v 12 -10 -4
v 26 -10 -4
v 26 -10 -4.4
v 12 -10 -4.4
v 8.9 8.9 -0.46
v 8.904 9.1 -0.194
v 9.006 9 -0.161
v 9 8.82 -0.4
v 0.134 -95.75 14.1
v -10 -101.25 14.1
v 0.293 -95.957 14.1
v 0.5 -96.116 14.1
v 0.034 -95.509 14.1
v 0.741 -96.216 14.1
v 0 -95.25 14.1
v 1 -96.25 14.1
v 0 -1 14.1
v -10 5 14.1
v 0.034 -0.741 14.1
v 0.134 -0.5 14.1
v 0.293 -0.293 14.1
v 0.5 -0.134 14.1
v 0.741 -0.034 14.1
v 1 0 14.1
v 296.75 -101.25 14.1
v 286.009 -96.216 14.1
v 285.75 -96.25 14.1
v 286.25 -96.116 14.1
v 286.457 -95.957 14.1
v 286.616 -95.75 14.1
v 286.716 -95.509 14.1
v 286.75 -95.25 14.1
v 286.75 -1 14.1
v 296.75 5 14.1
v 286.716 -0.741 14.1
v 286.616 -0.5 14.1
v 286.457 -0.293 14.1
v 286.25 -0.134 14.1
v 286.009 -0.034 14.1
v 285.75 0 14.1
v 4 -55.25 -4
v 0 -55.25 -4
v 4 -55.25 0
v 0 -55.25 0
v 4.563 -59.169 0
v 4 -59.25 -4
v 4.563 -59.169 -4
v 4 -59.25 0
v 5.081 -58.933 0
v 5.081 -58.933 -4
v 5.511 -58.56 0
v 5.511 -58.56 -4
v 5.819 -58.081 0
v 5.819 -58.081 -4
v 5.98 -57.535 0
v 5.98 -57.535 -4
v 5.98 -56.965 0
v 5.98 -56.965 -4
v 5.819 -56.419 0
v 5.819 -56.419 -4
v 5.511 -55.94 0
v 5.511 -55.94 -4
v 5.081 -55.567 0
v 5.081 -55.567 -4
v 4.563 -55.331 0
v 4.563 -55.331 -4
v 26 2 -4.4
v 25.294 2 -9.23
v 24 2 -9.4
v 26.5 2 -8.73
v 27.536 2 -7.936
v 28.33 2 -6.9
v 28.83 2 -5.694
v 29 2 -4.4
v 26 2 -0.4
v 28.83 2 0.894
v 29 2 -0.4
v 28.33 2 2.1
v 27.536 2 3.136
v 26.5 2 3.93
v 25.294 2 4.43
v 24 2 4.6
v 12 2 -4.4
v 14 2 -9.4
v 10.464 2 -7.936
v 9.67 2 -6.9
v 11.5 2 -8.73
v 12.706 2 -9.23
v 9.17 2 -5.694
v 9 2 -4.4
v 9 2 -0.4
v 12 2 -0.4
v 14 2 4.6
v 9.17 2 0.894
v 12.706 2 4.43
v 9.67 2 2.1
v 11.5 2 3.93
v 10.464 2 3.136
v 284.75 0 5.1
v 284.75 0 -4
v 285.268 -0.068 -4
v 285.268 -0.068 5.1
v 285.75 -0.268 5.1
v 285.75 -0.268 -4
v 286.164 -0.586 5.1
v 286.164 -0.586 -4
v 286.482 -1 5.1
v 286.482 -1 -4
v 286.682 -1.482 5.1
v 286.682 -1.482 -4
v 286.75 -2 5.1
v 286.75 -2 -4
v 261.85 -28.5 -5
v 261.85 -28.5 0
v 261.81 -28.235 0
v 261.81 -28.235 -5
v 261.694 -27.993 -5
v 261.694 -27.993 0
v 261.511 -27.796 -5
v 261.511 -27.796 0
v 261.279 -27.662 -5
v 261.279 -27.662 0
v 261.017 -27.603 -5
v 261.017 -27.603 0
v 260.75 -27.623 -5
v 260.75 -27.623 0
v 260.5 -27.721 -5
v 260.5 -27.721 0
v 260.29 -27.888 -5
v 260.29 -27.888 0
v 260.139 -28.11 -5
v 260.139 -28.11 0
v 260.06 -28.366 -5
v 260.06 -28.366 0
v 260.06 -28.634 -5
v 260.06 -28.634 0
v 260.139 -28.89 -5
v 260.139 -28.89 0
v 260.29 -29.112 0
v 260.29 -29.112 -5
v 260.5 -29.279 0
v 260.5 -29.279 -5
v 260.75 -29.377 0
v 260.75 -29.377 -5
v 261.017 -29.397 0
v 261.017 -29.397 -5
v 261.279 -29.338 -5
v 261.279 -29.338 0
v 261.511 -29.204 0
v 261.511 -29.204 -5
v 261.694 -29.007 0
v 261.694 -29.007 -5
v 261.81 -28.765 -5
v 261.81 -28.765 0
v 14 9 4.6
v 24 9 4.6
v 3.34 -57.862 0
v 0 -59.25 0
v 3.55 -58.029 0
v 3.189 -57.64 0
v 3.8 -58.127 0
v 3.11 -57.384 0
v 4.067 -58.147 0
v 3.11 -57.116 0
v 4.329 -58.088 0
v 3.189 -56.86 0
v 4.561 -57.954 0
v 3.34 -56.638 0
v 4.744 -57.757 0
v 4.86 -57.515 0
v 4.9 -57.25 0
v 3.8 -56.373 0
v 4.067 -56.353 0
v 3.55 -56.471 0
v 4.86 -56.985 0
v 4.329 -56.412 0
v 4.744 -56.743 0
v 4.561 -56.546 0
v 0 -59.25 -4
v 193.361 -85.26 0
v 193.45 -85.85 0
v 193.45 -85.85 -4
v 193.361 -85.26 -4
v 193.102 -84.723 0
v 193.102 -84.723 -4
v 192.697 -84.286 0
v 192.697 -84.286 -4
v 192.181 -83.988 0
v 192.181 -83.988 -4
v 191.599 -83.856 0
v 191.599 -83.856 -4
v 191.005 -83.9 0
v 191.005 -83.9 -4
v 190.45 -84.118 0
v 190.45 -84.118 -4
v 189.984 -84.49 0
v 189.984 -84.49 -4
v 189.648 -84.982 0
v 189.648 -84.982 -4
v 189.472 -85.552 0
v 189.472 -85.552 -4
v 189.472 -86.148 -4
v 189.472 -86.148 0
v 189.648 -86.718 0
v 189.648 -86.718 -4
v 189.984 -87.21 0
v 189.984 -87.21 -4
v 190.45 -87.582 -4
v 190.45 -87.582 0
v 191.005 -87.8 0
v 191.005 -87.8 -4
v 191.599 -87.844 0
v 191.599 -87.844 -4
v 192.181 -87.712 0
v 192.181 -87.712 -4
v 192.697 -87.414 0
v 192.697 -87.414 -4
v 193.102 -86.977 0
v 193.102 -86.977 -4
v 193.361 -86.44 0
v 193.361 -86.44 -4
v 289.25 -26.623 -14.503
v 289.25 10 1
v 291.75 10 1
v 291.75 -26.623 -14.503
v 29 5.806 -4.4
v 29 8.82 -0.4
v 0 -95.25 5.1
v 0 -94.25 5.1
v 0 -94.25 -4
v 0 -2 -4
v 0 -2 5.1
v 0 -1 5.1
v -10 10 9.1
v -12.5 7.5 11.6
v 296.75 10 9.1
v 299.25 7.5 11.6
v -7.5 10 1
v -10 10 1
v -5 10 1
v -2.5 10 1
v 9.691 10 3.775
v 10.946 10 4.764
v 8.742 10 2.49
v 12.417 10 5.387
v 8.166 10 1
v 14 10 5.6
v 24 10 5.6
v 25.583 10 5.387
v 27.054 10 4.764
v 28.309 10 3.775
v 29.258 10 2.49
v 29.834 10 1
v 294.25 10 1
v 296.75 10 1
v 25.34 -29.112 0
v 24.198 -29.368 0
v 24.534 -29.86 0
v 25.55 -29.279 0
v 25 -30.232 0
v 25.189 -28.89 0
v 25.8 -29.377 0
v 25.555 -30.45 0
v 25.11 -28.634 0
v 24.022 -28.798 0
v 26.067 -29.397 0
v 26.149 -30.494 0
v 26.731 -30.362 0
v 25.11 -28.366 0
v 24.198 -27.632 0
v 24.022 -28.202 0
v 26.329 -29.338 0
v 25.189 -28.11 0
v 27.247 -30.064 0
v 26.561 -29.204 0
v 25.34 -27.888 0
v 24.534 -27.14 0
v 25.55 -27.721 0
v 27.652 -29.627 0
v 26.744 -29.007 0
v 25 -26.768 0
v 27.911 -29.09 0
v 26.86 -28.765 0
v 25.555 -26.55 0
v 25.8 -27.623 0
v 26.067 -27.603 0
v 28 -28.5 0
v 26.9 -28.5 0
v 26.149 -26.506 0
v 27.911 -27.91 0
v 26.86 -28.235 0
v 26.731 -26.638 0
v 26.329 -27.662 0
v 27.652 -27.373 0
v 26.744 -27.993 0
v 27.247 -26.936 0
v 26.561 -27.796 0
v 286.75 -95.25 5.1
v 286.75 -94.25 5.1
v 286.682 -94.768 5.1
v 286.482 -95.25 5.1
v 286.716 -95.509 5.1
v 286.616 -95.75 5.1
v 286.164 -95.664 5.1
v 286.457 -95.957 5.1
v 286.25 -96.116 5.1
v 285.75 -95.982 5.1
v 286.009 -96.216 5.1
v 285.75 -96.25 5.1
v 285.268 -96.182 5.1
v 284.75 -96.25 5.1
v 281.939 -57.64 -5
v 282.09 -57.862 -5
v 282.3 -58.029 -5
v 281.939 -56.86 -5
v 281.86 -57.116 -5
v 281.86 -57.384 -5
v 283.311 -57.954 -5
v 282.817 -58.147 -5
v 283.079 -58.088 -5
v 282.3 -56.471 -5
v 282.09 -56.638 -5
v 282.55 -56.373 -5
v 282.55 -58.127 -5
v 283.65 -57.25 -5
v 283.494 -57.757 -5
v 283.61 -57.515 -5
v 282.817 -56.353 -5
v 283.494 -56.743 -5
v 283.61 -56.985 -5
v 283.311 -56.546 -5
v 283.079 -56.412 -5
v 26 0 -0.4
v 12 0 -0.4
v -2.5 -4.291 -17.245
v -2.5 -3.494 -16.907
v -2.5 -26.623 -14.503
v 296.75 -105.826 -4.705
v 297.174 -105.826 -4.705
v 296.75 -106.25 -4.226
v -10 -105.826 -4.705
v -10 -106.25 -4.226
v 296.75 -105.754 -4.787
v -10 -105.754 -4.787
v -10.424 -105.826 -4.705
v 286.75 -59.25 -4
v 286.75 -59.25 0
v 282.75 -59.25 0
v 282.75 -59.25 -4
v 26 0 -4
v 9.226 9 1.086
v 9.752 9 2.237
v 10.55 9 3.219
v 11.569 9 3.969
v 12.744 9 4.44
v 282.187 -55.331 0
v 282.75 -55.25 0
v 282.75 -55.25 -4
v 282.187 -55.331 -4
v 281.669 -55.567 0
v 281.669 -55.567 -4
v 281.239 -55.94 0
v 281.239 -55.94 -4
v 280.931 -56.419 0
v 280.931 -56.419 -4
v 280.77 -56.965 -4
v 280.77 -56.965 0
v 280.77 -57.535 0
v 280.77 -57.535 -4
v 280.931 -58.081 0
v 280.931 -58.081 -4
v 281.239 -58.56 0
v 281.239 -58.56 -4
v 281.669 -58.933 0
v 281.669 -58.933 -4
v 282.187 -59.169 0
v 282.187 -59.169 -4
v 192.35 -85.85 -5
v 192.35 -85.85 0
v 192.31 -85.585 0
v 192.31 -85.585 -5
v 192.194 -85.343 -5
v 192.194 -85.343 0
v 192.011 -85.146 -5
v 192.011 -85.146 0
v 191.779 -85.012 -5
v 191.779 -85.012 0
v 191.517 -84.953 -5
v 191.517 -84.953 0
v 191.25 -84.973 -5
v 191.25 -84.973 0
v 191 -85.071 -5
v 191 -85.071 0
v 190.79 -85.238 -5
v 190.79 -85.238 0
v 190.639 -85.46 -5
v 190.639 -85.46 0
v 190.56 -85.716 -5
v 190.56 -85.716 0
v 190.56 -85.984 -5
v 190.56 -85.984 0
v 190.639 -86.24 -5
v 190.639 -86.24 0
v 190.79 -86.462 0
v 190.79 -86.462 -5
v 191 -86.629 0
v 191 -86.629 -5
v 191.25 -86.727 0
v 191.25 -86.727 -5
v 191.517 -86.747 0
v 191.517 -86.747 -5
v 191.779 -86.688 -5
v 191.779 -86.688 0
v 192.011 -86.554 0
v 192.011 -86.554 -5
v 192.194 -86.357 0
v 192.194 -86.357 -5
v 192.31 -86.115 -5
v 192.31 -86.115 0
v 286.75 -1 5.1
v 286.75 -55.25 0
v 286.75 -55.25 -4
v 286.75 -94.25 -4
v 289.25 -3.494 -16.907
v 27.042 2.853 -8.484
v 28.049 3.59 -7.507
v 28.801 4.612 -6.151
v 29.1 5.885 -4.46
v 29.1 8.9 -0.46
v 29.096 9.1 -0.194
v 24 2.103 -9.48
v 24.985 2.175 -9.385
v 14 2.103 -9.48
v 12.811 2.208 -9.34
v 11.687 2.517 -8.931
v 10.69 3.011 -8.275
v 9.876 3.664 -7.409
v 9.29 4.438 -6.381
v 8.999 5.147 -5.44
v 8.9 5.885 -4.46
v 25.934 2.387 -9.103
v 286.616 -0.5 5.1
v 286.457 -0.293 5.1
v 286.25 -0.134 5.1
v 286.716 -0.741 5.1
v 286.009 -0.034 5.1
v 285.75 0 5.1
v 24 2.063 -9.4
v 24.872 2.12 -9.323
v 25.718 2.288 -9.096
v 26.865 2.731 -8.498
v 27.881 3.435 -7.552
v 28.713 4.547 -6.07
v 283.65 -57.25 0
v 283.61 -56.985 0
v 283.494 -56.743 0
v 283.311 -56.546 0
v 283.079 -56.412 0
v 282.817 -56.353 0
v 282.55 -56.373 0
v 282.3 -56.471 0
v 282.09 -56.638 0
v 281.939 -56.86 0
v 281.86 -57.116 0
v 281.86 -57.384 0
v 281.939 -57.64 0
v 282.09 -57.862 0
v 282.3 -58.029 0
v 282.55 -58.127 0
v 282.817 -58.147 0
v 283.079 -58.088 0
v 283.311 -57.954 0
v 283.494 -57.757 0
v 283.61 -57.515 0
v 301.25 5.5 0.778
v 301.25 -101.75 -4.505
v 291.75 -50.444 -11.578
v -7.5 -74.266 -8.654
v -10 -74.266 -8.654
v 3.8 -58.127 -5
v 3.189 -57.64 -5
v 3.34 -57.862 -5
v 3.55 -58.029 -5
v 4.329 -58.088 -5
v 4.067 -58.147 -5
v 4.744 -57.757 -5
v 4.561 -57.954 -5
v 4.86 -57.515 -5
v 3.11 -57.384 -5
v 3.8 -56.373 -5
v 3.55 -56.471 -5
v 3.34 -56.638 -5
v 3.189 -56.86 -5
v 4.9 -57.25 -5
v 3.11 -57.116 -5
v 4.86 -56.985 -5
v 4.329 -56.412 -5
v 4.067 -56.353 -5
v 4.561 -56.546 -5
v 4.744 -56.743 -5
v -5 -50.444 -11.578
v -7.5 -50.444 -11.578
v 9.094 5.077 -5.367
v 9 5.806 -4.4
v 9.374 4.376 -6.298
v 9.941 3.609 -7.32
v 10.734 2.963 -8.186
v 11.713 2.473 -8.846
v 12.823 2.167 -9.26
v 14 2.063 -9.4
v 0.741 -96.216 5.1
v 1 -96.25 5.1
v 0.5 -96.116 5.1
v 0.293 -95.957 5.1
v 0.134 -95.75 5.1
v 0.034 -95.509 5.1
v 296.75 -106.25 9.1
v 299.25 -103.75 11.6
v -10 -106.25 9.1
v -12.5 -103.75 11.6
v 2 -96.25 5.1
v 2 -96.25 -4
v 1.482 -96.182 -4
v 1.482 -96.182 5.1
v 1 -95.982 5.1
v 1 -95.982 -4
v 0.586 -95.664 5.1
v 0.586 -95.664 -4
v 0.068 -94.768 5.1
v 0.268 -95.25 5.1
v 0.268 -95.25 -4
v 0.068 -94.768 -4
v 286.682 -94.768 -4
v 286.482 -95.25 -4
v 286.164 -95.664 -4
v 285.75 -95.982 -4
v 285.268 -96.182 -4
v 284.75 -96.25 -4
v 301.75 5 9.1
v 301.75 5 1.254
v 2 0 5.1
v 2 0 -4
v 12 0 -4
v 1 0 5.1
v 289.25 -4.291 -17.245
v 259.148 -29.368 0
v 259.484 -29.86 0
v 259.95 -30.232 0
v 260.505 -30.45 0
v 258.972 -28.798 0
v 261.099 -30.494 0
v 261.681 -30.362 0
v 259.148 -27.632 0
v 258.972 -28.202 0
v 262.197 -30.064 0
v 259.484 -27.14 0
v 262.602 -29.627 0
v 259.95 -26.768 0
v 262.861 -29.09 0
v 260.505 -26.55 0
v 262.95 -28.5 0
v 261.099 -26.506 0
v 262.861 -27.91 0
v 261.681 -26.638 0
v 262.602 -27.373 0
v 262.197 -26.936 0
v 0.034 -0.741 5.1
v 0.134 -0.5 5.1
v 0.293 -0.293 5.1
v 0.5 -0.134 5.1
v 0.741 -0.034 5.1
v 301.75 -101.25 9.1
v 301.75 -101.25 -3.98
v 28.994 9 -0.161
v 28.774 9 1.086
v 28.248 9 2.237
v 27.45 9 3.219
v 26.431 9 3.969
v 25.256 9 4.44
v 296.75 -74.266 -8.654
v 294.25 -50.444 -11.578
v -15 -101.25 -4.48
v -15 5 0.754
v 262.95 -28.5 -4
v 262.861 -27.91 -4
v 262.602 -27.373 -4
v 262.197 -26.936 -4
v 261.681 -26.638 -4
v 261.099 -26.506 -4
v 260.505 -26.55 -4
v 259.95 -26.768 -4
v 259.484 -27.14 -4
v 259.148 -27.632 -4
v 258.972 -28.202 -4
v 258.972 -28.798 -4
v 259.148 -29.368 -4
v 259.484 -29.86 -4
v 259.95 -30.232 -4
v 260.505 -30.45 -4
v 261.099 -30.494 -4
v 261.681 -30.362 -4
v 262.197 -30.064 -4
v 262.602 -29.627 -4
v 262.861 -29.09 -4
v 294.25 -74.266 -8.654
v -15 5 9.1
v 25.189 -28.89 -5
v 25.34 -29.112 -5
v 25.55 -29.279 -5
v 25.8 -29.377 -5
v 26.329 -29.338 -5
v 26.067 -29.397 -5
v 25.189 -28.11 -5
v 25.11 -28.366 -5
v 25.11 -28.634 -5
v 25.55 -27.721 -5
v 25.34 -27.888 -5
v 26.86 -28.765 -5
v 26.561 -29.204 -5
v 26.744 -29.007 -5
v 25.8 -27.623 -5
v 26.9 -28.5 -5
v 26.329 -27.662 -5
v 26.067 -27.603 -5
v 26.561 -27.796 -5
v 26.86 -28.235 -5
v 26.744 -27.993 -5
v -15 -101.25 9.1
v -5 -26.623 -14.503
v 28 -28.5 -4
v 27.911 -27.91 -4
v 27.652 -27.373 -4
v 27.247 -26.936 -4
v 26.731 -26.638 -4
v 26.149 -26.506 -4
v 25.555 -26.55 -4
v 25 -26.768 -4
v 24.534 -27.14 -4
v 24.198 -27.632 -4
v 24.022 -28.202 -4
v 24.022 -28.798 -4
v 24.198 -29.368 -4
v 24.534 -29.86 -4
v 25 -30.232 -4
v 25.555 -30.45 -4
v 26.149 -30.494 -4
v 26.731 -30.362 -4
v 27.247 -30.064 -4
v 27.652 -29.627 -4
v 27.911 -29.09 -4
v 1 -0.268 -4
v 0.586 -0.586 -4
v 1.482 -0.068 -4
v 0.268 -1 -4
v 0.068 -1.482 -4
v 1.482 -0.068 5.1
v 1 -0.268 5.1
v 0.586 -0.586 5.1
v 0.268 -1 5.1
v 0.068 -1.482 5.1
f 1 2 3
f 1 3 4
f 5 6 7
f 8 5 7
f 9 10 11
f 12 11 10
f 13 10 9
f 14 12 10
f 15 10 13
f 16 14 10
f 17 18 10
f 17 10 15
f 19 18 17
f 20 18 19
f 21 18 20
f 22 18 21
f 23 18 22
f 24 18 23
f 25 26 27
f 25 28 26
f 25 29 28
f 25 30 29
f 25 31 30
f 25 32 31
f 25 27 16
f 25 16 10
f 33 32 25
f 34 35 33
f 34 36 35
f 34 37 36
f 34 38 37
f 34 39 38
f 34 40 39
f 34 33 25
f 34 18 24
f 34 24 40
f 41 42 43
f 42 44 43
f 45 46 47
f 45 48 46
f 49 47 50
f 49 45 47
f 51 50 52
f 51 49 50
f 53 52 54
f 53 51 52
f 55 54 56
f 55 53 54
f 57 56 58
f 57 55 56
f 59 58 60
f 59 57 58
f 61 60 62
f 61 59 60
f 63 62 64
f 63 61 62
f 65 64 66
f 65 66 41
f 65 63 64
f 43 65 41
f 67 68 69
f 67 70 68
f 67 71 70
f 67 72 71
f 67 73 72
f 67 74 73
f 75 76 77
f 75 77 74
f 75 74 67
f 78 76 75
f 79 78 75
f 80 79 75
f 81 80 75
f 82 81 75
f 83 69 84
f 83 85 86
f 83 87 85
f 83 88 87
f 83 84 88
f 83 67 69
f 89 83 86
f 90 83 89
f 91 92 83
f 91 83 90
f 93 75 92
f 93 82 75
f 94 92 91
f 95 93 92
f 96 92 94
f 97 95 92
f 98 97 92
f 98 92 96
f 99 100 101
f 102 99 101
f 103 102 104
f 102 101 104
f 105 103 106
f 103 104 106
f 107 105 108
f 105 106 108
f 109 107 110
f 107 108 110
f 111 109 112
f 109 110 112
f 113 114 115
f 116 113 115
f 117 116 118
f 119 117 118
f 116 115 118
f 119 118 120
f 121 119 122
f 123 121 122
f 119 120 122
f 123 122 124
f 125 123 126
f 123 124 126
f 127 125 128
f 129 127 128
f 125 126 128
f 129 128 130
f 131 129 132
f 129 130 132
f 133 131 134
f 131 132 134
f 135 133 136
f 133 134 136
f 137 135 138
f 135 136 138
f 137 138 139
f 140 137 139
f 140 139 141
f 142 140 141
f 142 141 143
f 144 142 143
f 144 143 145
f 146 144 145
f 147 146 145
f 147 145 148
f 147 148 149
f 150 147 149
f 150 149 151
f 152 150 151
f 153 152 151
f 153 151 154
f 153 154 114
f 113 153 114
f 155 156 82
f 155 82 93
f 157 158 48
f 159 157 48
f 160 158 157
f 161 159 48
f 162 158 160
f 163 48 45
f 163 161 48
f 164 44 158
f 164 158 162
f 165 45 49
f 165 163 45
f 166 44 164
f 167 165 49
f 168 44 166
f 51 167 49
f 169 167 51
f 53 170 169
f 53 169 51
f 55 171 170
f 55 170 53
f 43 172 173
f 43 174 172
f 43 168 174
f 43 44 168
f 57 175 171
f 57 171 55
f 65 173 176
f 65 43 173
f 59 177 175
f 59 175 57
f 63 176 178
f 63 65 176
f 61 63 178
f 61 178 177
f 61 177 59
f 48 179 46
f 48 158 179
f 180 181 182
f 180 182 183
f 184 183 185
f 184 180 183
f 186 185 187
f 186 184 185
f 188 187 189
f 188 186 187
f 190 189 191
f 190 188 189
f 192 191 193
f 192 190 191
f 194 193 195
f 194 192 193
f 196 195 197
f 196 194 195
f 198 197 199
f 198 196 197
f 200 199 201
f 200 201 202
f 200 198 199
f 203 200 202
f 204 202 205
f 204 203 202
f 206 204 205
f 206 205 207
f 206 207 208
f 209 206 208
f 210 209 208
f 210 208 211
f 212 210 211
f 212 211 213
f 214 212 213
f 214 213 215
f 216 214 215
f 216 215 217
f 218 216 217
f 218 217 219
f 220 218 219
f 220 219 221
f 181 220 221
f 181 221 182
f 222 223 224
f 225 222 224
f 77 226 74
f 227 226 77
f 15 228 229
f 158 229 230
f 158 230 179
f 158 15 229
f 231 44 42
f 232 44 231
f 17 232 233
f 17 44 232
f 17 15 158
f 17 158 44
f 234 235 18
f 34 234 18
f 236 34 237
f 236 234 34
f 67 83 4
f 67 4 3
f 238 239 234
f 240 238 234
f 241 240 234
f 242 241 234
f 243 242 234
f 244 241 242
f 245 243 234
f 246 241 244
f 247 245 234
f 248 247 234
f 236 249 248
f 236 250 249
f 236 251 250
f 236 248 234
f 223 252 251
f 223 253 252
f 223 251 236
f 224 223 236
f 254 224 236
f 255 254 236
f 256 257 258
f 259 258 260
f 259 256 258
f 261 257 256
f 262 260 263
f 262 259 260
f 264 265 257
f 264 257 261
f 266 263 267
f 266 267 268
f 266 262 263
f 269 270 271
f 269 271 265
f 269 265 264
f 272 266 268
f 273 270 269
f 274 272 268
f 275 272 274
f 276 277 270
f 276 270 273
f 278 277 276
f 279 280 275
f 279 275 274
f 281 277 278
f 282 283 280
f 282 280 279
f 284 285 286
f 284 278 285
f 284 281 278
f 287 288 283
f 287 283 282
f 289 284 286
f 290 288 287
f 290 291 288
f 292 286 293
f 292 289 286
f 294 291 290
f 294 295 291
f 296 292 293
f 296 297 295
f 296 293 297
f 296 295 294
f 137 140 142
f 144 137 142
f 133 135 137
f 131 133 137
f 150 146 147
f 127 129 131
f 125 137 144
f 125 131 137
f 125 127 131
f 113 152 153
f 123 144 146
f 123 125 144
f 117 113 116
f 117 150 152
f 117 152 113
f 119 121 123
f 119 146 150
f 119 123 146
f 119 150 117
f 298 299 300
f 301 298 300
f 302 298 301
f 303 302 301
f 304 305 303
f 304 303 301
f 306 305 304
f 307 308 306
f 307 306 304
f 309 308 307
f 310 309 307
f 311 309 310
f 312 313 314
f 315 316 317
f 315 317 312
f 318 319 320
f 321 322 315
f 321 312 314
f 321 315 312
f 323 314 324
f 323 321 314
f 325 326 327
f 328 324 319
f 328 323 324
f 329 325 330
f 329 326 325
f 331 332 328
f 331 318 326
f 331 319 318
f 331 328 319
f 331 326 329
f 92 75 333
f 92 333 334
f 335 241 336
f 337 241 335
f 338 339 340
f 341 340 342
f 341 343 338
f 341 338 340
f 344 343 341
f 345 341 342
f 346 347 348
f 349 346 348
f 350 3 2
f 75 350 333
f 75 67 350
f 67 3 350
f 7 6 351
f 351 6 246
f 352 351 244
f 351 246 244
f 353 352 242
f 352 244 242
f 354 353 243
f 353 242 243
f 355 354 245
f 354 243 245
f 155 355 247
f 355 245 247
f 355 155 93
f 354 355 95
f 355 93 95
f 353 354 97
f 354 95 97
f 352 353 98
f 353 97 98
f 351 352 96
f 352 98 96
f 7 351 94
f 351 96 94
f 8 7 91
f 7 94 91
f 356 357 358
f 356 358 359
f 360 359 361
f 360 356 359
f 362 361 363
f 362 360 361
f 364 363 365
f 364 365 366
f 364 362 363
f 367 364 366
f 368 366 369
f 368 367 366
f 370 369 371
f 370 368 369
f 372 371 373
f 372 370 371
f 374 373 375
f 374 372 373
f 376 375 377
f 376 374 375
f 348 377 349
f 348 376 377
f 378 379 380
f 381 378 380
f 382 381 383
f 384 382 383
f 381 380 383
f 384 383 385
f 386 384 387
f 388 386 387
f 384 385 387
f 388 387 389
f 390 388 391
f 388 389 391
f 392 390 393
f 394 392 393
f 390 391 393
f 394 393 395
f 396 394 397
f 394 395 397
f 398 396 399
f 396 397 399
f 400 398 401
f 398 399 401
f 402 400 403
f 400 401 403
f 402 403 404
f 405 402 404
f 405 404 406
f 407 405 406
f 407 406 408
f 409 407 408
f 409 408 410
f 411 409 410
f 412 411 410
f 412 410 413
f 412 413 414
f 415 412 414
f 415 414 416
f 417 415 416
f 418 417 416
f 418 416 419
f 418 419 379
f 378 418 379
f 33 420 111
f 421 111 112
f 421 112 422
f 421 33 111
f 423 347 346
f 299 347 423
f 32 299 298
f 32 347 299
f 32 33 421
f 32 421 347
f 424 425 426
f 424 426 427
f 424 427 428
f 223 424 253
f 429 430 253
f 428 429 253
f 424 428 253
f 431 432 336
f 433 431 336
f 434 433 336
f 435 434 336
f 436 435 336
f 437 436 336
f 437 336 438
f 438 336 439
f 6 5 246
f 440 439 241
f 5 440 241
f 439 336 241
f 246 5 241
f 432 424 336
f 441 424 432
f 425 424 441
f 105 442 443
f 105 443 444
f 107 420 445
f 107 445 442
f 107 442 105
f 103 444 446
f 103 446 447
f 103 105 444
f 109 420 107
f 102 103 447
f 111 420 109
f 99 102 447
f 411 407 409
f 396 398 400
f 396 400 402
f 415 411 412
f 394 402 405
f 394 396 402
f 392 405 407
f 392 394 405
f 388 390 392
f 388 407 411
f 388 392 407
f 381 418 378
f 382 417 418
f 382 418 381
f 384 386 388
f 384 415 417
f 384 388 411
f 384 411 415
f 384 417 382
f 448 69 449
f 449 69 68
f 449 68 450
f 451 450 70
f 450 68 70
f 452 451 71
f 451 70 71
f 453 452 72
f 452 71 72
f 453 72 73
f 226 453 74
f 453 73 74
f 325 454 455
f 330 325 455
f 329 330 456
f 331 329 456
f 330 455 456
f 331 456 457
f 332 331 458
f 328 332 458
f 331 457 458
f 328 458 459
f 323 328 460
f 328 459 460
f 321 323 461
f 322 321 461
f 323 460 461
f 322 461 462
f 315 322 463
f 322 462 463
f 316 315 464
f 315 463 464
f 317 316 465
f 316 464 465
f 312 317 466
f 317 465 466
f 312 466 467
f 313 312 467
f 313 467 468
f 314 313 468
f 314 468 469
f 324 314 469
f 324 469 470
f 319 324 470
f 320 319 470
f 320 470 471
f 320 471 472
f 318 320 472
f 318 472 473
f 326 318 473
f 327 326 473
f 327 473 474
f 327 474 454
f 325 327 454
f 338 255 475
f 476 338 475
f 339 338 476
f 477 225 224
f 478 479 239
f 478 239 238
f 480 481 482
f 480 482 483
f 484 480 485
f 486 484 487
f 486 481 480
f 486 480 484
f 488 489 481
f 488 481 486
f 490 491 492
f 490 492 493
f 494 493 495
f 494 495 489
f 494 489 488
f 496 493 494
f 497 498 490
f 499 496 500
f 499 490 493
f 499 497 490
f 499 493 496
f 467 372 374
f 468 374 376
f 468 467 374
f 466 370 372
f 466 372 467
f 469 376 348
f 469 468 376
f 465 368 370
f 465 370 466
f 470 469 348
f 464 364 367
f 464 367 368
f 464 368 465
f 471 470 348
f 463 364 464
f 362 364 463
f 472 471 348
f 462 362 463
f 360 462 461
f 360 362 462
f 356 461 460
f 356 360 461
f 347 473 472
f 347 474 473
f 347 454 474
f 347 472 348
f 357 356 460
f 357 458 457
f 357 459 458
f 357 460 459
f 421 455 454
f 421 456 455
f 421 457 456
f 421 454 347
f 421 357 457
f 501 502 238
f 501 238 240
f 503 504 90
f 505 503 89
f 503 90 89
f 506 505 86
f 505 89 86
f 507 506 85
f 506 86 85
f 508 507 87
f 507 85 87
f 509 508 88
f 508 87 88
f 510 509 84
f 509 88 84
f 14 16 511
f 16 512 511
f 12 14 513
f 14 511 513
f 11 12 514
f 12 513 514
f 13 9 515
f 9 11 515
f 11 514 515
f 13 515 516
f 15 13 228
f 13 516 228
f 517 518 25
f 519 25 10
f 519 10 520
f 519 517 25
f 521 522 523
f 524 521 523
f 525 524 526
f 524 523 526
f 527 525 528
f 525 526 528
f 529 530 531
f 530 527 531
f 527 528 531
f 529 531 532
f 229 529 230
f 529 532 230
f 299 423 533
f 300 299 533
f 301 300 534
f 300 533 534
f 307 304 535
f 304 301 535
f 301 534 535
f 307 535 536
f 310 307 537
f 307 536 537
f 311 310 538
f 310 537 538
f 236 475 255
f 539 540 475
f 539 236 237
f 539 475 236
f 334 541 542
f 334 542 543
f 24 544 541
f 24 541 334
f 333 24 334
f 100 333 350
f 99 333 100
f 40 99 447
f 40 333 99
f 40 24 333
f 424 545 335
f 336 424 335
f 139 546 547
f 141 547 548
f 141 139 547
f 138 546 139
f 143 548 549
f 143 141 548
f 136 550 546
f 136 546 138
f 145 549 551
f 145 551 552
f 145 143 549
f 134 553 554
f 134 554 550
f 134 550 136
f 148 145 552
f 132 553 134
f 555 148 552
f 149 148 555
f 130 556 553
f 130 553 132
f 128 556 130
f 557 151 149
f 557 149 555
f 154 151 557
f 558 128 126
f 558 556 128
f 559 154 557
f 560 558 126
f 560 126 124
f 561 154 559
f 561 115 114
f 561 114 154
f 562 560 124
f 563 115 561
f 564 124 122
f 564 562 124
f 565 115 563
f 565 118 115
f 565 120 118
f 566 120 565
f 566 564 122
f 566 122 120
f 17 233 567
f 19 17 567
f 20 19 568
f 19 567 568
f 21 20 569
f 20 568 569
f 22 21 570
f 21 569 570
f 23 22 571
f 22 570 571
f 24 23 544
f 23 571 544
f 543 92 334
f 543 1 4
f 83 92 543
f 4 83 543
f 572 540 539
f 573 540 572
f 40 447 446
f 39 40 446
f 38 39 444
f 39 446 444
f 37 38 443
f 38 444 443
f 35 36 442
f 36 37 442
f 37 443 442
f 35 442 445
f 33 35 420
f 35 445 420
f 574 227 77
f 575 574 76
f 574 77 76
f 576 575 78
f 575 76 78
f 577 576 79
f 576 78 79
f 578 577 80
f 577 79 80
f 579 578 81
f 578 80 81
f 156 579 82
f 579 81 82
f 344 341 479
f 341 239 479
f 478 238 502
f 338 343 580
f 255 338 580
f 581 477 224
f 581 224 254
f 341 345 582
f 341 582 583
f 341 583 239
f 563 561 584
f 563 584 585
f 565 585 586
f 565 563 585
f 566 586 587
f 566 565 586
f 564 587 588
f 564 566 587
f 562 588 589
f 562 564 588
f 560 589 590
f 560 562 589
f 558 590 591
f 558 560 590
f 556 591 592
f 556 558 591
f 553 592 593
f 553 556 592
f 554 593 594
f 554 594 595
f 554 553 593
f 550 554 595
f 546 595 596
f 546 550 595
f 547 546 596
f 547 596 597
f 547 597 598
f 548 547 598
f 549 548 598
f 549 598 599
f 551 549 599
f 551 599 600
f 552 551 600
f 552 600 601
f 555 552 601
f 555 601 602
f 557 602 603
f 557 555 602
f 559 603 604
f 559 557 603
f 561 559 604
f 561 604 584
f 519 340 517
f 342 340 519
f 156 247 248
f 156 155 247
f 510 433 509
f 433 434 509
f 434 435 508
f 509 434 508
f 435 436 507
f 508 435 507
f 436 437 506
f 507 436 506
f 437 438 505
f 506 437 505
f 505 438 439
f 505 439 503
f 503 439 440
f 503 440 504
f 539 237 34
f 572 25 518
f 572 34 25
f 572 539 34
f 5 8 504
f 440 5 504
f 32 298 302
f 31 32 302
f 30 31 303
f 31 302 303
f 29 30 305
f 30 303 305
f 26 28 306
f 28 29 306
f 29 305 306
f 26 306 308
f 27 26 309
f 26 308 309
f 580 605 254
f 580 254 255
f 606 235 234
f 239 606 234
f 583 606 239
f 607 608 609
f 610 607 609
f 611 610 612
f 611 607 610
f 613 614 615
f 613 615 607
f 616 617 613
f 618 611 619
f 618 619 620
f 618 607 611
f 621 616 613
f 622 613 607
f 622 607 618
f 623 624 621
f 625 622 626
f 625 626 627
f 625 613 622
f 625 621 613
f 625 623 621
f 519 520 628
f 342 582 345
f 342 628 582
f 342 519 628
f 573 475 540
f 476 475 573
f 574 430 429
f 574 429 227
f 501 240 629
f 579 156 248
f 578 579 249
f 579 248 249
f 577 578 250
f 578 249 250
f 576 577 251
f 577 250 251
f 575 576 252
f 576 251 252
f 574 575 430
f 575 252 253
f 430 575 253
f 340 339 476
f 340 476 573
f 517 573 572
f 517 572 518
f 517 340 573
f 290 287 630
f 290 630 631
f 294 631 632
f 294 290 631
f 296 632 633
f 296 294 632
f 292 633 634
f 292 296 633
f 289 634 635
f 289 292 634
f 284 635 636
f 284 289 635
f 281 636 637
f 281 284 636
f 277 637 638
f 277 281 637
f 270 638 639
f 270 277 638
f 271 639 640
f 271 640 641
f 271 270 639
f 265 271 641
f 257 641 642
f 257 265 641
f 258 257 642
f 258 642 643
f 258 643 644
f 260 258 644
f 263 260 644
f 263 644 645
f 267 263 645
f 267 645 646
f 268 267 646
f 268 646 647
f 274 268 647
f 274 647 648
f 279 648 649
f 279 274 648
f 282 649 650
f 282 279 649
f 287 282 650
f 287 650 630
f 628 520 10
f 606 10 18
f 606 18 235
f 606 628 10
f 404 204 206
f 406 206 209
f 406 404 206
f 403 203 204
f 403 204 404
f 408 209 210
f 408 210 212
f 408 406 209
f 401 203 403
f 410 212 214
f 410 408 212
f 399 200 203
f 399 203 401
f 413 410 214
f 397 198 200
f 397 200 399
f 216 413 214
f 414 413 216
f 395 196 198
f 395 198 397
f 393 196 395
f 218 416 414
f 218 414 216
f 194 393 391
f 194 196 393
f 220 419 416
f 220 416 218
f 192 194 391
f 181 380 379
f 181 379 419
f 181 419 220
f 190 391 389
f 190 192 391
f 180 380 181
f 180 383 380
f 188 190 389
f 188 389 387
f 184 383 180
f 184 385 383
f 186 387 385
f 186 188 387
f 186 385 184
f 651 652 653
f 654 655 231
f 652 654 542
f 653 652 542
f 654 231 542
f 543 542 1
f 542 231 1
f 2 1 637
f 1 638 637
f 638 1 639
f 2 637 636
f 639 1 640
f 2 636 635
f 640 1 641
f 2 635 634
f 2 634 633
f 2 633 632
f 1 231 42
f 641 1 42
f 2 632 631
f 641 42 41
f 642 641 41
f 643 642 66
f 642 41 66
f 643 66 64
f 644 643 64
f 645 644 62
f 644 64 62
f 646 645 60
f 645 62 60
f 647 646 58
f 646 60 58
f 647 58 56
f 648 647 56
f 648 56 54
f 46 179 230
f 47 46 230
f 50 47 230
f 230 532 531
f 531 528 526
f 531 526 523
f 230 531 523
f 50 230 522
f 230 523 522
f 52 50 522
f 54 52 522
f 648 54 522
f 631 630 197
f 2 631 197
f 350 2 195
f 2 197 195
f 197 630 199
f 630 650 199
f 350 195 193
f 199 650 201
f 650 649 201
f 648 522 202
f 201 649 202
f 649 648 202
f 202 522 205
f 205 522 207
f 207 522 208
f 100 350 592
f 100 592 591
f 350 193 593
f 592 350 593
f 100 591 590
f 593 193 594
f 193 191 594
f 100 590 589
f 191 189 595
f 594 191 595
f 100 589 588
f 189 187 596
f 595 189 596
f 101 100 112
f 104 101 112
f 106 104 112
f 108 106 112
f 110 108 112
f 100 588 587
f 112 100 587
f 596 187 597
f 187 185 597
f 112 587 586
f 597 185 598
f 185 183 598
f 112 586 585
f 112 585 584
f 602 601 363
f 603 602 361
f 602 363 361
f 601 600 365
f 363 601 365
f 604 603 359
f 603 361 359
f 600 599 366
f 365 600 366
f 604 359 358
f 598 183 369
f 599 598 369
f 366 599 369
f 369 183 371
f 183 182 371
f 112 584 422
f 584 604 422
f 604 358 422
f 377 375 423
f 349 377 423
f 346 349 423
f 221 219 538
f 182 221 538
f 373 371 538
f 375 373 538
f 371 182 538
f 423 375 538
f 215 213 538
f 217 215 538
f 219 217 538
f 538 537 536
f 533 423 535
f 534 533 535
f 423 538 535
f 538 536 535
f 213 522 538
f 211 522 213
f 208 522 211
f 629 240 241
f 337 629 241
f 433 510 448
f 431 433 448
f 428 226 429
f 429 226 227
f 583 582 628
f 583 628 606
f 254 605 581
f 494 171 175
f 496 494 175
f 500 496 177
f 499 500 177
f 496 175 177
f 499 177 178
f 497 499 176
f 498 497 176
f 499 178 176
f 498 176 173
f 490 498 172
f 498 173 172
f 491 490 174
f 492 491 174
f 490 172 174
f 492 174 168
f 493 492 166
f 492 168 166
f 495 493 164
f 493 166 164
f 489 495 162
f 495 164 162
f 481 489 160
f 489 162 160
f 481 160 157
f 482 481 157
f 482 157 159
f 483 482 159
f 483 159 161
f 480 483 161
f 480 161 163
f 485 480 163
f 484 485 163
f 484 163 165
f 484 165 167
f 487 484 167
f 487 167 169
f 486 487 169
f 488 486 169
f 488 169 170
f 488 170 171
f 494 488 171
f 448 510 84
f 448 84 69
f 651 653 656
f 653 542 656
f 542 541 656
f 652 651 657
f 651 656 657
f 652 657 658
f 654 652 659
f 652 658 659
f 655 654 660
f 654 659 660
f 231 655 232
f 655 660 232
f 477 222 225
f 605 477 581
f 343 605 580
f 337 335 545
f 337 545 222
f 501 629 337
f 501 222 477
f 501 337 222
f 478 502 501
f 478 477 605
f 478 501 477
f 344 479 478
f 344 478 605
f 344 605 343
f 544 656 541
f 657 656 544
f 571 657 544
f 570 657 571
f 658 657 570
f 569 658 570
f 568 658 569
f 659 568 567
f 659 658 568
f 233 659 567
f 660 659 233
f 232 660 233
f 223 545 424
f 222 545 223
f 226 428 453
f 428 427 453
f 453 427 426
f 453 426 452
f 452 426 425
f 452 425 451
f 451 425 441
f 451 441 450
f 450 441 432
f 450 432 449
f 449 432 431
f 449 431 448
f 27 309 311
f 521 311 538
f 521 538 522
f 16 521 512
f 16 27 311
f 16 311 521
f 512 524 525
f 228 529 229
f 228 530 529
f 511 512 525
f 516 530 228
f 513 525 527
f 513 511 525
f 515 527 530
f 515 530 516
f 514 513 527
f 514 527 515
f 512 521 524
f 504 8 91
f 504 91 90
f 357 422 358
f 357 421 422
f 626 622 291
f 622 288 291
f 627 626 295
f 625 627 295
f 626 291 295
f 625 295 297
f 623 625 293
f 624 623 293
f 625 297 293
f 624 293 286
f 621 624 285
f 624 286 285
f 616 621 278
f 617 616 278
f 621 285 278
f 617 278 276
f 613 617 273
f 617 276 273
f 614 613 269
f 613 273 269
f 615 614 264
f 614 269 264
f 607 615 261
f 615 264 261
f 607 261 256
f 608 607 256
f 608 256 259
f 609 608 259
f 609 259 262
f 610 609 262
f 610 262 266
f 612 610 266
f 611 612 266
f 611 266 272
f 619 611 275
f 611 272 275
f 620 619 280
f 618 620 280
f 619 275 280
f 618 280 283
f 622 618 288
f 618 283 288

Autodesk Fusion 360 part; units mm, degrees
sketch "スケッチ1" plane through (0, 0, 0) normal (0, 0, 1) x (1, 0, 0)
  line L0 (0, 0) -> (286.75, 0)
  line L1 (286.75, 0) -> (286.75, -96.25)
  line L2 (286.75, -96.25) -> (0, -96.25)
  line L3 (0, -96.25) -> (0, 0)
  line L4 (-15, 10) -> (301.75, 10)
  line L5 (301.75, 10) -> (301.75, -106.25)
  line L6 (301.75, -106.25) -> (-15, -106.25)
  line L7 (-15, -106.25) -> (-15, 10)
  circle A0 centre (260.95, -28.5) radius 2
  circle A1 centre (282.75, -57.25) radius 2
  circle A2 centre (191.45, -85.85) radius 2
  circle A3 centre (4, -57.25) radius 2
  circle A4 centre (26, -28.5) radius 2
  line L8 (286.75, -59.25) -> (282.75, -59.25)
  line L9 (286.75, -55.25) -> (282.75, -55.25)
  line L10 (0, -59.25) -> (4, -59.25)
  line L11 (0, -55.25) -> (4, -55.25)
  circle A5 centre (129, -47.75) radius 2
  circle A6 centre (4, -57.25) radius 0.9
  circle A7 centre (26, -28.5) radius 0.9
  circle A8 centre (191.45, -85.85) radius 0.9
  circle A9 centre (129, -47.75) radius 0.9
  circle A10 centre (282.75, -57.25) radius 0.9
  circle A11 centre (260.95, -28.5) radius 0.9
  dimension "d7" = 286.75
  dimension "d8" = 96.25
  dimension "d9" = 15
  dimension "d10" = 10
  dimension "d11" = 10
  dimension "d12" = 15
  dimension "d13" = 4
  dimension "d14" = 28.5
  dimension "d15" = 25.8
  dimension "d16" = 4
  dimension "d17" = 4
  dimension "d18" = 4
  dimension "d19" = 4
  dimension "d20" = 28.5
  dimension "d21" = 26
  dimension "d22" = 39
  dimension "d23" = 4
  dimension "d24" = 4
  dimension "d25" = 39
  dimension "d26" = 10.4
  dimension "d27" = 95.3
  dimension "d28" = 4
  dimension "d29" = 129
  dimension "d30" = 48.5
  dimension "d54" = 1.8
  dimension "d55" = 1.8
  dimension "d56" = 1.8
  dimension "d57" = 1.8
  dimension "d58" = 1.8
  dimension "d59" = 1.8
extrude "押し出し1" add sketch "スケッチ1" along normal blind 14.1 contours L4 L5 L6 L7
extrude "押し出し2" add sketch "スケッチ1" against normal blind 4 contours L4 L5 L6 L7
sketch "スケッチ2" plane through (0, 0, -4) normal (0, 0, -1) x (1, 0, 0)
  line L0 (0, 96.25) -> (286.75, 96.25)
  line L1 (286.75, 96.25) -> (286.75, 0)
  line L2 (286.75, 0) -> (0, 0)
  line L3 (0, 0) -> (0, 96.25)
  line L4 (301.75, 106.25) -> (-15, 106.25)
  line L5 (-15, 106.25) -> (-15, -10)
  line L6 (-15, -10) -> (301.75, -10)
  line L7 (301.75, -10) -> (301.75, 106.25)
extrude "押し出し3" add sketch "スケッチ2" along normal blind 15 contours L0 L1 L2 L3 | L4 L5 L6 L7
sketch "スケッチ3" plane through (-15, 0, 0) normal (-1, 0, 0) x (0, -1, 0)
  line L0 (106.25, -19) -> (106.25, 14.1)
  line L1 (106.25, 14.1) -> (-10, 14.1)
  line L2 (-10, 14.1) -> (-10, -19)
  line L3 (-10, -19) -> (106.25, -19)
  line L4 (-10, -19) -> (106.25, -4.7263)
  line L5 (3.7947, -17.3062) -> (-10, 1)
  dimension "d37" = 7
  dimension "d77" = 120
  dimension "d78" = 20
extrude "押し出し4" cut sketch "スケッチ3" against normal blind 320 contours L0 L3 L4 | L2 L4 L5
extrude "押し出し5" add sketch "スケッチ1" against normal blind 4 contours L3 A3 L10 L11 | L1 A1 L8 L9 | A3 | A1 | A0 | A2 | A4 | A6 | A7 | A8 | A10 | A11
sketch "スケッチ4" plane through (0, 10, 0) normal (0, 1, 0) x (-1, 0, 0)
  line L0 (15, 1) -> (15, 14.1)
  line L1 (15, 14.1) -> (-301.75, 14.1)
  line L2 (-301.75, 14.1) -> (-301.75, 1)
  line L3 (-29, 4.6) -> (-9, 4.6)
  line L4 (-9, 4.6) -> (-9, -9.4)
  line L5 (-9, -9.4) -> (-29, -9.4)
  line L6 (-29, -9.4) -> (-29, 4.6)
  line L7 (-26, -0.4) -> (-12, -0.4)
  line L8 (-12, -0.4) -> (-12, -4.4)
  line L9 (-12, -4.4) -> (-26, -4.4)
  line L10 (-26, -4.4) -> (-26, -0.4)
  line L11 (-301.75, 1) -> (15, 1)
  dimension "d42" = 20
  dimension "d43" = 14
  dimension "d44" = 24
  dimension "d45" = 9.5
  dimension "d46" = 14
  dimension "d47" = 4
  dimension "d48" = 27
  dimension "d49" = 14.5
extrude "押し出し6" cut sketch "スケッチ4" against normal blind 20 contours L7 L8 L9 L10
extrude "押し出し7" cut sketch "スケッチ4" against normal blind 8 contours L3 L4 L6 L11 | L4 L5 L6 L11
extrude "押し出し8" cut sketch "スケッチ1" against normal blind 5 contours A6 | A7 | A8 | A10 | A11
sketch "スケッチ6" plane through (-15, 0, 0) normal (-1, 0, 0) x (0, -1, 0)
  line L0 (3.7947, -17.3062) -> (106.25, -4.7263)
  line L1 (106.25, 14.1) -> (-10, 14.1)
  line L2 (-10, 1) -> (26.6233, -14.5032)
  line L3 (-10, 1) -> (50.4444, -11.5784)
  line L4 (-10, 1) -> (106.25, -4.7263)
  line L5 (-10, 1) -> (74.2655, -8.6535)
  line L6 (-10, 1) -> (3.7947, -17.3062)
  line L7 (106.25, -4.7263) -> (106.25, 14.1)
  line L8 (-10, 14.1) -> (-10, 1)
  point P0 (-10, 1)
  dimension "d79" = 23
  dimension "d80" = 47
  dimension "d81" = 71
  dimension "d82" = 103.2247
sketch "スケッチ7" plane through (0, 10, 0) normal (0, 1, 0) x (-1, 0, 0)
  line L0 (-29, 4.6) -> (-9, 4.6)
  line L1 (-9, 1) -> (15, 1)
  line L2 (15, 14.1) -> (-301.75, 14.1)
  line L3 (15, 1) -> (10, 1)
  line L4 (10, 1) -> (10, -24)
  line L5 (10, -24) -> (15, -24)
  line L6 (15, -24) -> (15, 1)
  line L7 (10, 1) -> (7.5, 1)
  line L8 (7.5, 1) -> (7.5, -24)
  line L9 (7.5, -24) -> (10, -24)
  line L10 (10, -24) -> (10, 1)
  line L11 (7.5, 1) -> (5, 1)
  line L12 (5, 1) -> (5, -24)
  line L13 (5, -24) -> (7.5, -24)
  line L14 (7.5, -24) -> (7.5, 1)
  line L15 (5, 1) -> (2.5, 1)
  line L16 (2.5, 1) -> (2.5, -24)
  line L17 (2.5, -24) -> (5, -24)
  line L18 (5, -24) -> (5, 1)
  line L19 (15, 1) -> (15, 14.1)
  line L20 (-301.75, 14.1) -> (-301.75, 1)
  line L21 (-9, 4.6) -> (-9, 1)
  line L22 (-301.75, 1) -> (-29, 1)
  line L23 (-29, 1) -> (-29, 4.6)
  dimension "d83" = 25
  dimension "d84" = 5
  dimension "d85" = 2.5
  dimension "d86" = 25
  dimension "d87" = 2.5
  dimension "d88" = 25
  dimension "d89" = 2.5
  dimension "d90" = 25
sweep "スイープ1" cut profiles "スケッチ7" path "スケッチ6" along L4 section 1 contours L1 L3 L4 L5 L6 L10
sweep "スイープ2" cut profiles "スケッチ7" path "スケッチ6" along L5 section 1 contours L1 L4 L7 L8 L9 L10 L14
sweep "スイープ3" cut profiles "スケッチ7" path "スケッチ6" along L3 section 1 contours L1 L8 L11 L12 L13 L14 L18
sweep "スイープ4" cut profiles "スケッチ7" path "スケッチ6" along L2 section 1 contours L1 L12 L15 L16 L17 L18
sketch "スケッチ8" plane through (301.75, 0, 0) normal (1, 0, 0) x (0, 1, 0)
  line L0 (-106.25, -4.7263) -> (-3.7947, -17.3062)
  line L1 (-3.7947, -17.3062) -> (10, 1)
  line L2 (10, 1) -> (10, 14.1)
  line L3 (10, 14.1) -> (-106.25, 14.1)
  line L4 (-106.25, 14.1) -> (-106.25, -4.7263)
  line L5 (10, 1) -> (-106.25, -4.7263)
  line L6 (10, 1) -> (-74.2655, -8.6535)
  line L7 (10, 1) -> (-50.4444, -11.5784)
  line L8 (10, 1) -> (-26.6233, -14.5032)
  dimension "d116" = 23
  dimension "d117" = 47
  dimension "d118" = 71
sketch "スケッチ9" plane through (0, 10, 0) normal (0, 1, 0) x (-1, 0, 0)
  line L0 (-9, 1) -> (2.5, 1)
  line L1 (15, 1) -> (15, 14.1)
  line L2 (15, 14.1) -> (-301.75, 14.1)
  line L3 (-301.75, 14.1) -> (-301.75, 1)
  line L4 (-301.75, 1) -> (-29, 1)
  line L5 (-29, 4.6) -> (-9, 4.6)
  line L6 (-301.75, 1) -> (-296.75, 1)
  line L7 (-296.75, 1) -> (-296.75, -24)
  line L8 (-296.75, -24) -> (-301.75, -24)
  line L9 (-301.75, -24) -> (-301.75, 1)
  line L10 (-296.75, 1) -> (-294.25, 1)
  line L11 (-294.25, 1) -> (-294.25, -24)
  line L12 (-294.25, -24) -> (-296.75, -24)
  line L13 (-296.75, -24) -> (-296.75, 1)
  line L14 (-294.25, 1) -> (-291.75, 1)
  line L15 (-291.75, 1) -> (-291.75, -24)
  line L16 (-291.75, -24) -> (-294.25, -24)
  line L17 (-294.25, -24) -> (-294.25, 1)
  line L18 (-291.75, 1) -> (-289.25, 1)
  line L19 (-289.25, 1) -> (-289.25, -24)
  line L20 (-289.25, -24) -> (-291.75, -24)
  line L21 (-291.75, -24) -> (-291.75, 1)
  line L22 (-9, 4.6) -> (-9, 1)
  line L23 (2.5, 1) -> (5, 1)
  line L24 (5, 1) -> (7.5, 1)
  line L25 (7.5, 1) -> (10, 1)
  line L26 (10, 1) -> (15, 1)
  line L27 (-29, 1) -> (-29, 4.6)
  dimension "d119" = 5
  dimension "d120" = 25
  dimension "d121" = 2.5
  dimension "d122" = 25
  dimension "d123" = 2.5
  dimension "d124" = 25
  dimension "d125" = 2.5
  dimension "d126" = 25
sweep "スイープ5" cut profiles "スケッチ9" path "スケッチ8" along L5 section 1 contours L4 L6 L7 L8 L9 L13
sweep "スイープ6" cut profiles "スケッチ9" path "スケッチ8" along L6 section 1 contours L4 L7 L10 L11 L12 L13 L17
sweep "スイープ7" cut profiles "スケッチ9" path "スケッチ8" along L7 section 1 contours L4 L11 L14 L15 L16 L17 L21
sweep "スイープ8" cut profiles "スケッチ9" path "スケッチ8" along L8 section 1 contours L4 L15 L18 L19 L20 L21
fillet "フィレット6" radius 2 4 edges at (0, 0, 5.05) (0, -96.25, 5.05) (286.75, -96.25, 5.05) (286.75, 0, 5.05)
sketch "スケッチ11" plane through (0, 0, 14.1) normal (0, 0, 1) x (-1, 0, 0)
  line L0 (-284.75, 96.25) -> (-2, 96.25)
  arc A0 (0, 94.25) -> (-2, 96.25) centre (-2, 94.25) ccw
  line L1 (0, 94.25) -> (0, 2)
  arc A1 (-2, 0) -> (0, 2) centre (-2, 2) ccw
  line L2 (-2, 0) -> (-284.75, 0)
  arc A2 (-286.75, 2) -> (-284.75, 0) centre (-284.75, 2) ccw
  line L3 (-286.75, 2) -> (-286.75, 94.25)
  arc A3 (-284.75, 96.25) -> (-286.75, 94.25) centre (-284.75, 94.25) ccw
  line L4 (15, 106.25) -> (-301.75, 106.25)
  line L5 (-301.75, 106.25) -> (-301.75, -10)
  line L6 (-301.75, -10) -> (15, -10)
  line L7 (15, -10) -> (15, 106.25)
  line L8 (0, 0) -> (-286.75, 0)
  line L9 (-286.75, 0) -> (-286.75, 96.25)
  line L10 (-286.75, 96.25) -> (0, 96.25)
  line L11 (0, 96.25) -> (0, 0)
extrude "押し出し11" cut sketch "スケッチ11" against normal blind 9 contours A3 L9 L10 | A0 L10 L11 | A2 L8 L9 | A1 L8 L11
fillet "フィレット7" radius 1 4 edges at (286.75, 0, 9.6) (286.75, -96.25, 9.6) (0, -96.25, 9.6) (0, 0, 9.6)
fillet "フィレット5" radius 5 4 edges at (9, 6, 4.6) (9, 2.0815, -9.4) (29, 2.0815, -9.4) (29, 6, 4.6)
chamfer "面取り2" distance 5 angle 45 4 edges at (301.75, -106.25, 4.6869) (301.75, 10, 7.55) (-15, 10, 7.55) (-15, -106.25, 4.6869)
chamfer "面取り3" distance 5 angle 45 4 edges at (301.75, -48.125, 14.1) (143.375, -106.25, 14.1) (143.375, 10, 14.1) (-15, -48.125, 14.1)
chamfer "面取り6" distance 0.5 angle 45 1 edges at (301.75, -48.125, -1.8631)
chamfer "面取り6" distance 0.1 angle 45 7 edges at (9, 7.4379, -2.4) (9.0503, 9.4779, 0.3071) (28.9497, 9.4779, 0.3071) (29, 7.4379, -2.4) (27.5355, 3.2666, -7.9355) (19, 2.163, -9.4) (10.4645, 3.2666, -7.9355)
chamfer "面取り6" distance 1 angle 45 3 edges at (11, 10, 3.6) (27, 10, 3.6) (19, 10, 4.6)
chamfer "面取り7" distance 0.5 angle 45 2 edges at (143.375, -3.7947, -17.3062) (143.375, -106.25, -4.7263)
equation "d7 = ( 19.05 * 15 ) * 1 mm + ( 0.5 * 2 ) * 1 mm"
equation "d8 = ( 19.05 * 5 ) * 1 mm + ( 0.5 * 2 ) * 1 mm"
equation "d14 = 28 mm + 0.5 mm"
equation "d15 = 25.3 mm + 0.5 mm"
equation "d20 = 28 mm + 0.5 mm"
equation "d21 = 25.5 mm + 0.5 mm"
equation "d22 = 38.5 mm + 0.5 mm"
equation "d23 = 3.5 mm + 0.5 mm"
equation "d24 = 3.5 mm + 0.5 mm"
equation "d25 = 38.5 mm + 0.5 mm"
equation "d26 = 9.9 mm + 0.5 mm"
equation "d27 = 94.8 mm + 0.5 mm"
equation "d29 = 128.5 mm + 0.5 mm"
equation "d30 = 48 mm + 0.5 mm"
equation "d31 = 7.5 mm + 5 mm + 1.6 mm"
equation "d33 = -2 mm - 2 mm"
equation "d44 = 9 mm + 15 mm"
equation "d48 = 12 mm + 15 mm"
equation "d80 = ( 23 * 2 ) * 1 mm + 1 mm"
equation "d81 = ( 23 * 3 ) * 1 mm + 2 mm"
equation "d117 = ( 23 * 2 ) * 1 mm + 1 mm"
equation "d118 = ( 23 * 3 ) * 1 mm + 2 mm"
